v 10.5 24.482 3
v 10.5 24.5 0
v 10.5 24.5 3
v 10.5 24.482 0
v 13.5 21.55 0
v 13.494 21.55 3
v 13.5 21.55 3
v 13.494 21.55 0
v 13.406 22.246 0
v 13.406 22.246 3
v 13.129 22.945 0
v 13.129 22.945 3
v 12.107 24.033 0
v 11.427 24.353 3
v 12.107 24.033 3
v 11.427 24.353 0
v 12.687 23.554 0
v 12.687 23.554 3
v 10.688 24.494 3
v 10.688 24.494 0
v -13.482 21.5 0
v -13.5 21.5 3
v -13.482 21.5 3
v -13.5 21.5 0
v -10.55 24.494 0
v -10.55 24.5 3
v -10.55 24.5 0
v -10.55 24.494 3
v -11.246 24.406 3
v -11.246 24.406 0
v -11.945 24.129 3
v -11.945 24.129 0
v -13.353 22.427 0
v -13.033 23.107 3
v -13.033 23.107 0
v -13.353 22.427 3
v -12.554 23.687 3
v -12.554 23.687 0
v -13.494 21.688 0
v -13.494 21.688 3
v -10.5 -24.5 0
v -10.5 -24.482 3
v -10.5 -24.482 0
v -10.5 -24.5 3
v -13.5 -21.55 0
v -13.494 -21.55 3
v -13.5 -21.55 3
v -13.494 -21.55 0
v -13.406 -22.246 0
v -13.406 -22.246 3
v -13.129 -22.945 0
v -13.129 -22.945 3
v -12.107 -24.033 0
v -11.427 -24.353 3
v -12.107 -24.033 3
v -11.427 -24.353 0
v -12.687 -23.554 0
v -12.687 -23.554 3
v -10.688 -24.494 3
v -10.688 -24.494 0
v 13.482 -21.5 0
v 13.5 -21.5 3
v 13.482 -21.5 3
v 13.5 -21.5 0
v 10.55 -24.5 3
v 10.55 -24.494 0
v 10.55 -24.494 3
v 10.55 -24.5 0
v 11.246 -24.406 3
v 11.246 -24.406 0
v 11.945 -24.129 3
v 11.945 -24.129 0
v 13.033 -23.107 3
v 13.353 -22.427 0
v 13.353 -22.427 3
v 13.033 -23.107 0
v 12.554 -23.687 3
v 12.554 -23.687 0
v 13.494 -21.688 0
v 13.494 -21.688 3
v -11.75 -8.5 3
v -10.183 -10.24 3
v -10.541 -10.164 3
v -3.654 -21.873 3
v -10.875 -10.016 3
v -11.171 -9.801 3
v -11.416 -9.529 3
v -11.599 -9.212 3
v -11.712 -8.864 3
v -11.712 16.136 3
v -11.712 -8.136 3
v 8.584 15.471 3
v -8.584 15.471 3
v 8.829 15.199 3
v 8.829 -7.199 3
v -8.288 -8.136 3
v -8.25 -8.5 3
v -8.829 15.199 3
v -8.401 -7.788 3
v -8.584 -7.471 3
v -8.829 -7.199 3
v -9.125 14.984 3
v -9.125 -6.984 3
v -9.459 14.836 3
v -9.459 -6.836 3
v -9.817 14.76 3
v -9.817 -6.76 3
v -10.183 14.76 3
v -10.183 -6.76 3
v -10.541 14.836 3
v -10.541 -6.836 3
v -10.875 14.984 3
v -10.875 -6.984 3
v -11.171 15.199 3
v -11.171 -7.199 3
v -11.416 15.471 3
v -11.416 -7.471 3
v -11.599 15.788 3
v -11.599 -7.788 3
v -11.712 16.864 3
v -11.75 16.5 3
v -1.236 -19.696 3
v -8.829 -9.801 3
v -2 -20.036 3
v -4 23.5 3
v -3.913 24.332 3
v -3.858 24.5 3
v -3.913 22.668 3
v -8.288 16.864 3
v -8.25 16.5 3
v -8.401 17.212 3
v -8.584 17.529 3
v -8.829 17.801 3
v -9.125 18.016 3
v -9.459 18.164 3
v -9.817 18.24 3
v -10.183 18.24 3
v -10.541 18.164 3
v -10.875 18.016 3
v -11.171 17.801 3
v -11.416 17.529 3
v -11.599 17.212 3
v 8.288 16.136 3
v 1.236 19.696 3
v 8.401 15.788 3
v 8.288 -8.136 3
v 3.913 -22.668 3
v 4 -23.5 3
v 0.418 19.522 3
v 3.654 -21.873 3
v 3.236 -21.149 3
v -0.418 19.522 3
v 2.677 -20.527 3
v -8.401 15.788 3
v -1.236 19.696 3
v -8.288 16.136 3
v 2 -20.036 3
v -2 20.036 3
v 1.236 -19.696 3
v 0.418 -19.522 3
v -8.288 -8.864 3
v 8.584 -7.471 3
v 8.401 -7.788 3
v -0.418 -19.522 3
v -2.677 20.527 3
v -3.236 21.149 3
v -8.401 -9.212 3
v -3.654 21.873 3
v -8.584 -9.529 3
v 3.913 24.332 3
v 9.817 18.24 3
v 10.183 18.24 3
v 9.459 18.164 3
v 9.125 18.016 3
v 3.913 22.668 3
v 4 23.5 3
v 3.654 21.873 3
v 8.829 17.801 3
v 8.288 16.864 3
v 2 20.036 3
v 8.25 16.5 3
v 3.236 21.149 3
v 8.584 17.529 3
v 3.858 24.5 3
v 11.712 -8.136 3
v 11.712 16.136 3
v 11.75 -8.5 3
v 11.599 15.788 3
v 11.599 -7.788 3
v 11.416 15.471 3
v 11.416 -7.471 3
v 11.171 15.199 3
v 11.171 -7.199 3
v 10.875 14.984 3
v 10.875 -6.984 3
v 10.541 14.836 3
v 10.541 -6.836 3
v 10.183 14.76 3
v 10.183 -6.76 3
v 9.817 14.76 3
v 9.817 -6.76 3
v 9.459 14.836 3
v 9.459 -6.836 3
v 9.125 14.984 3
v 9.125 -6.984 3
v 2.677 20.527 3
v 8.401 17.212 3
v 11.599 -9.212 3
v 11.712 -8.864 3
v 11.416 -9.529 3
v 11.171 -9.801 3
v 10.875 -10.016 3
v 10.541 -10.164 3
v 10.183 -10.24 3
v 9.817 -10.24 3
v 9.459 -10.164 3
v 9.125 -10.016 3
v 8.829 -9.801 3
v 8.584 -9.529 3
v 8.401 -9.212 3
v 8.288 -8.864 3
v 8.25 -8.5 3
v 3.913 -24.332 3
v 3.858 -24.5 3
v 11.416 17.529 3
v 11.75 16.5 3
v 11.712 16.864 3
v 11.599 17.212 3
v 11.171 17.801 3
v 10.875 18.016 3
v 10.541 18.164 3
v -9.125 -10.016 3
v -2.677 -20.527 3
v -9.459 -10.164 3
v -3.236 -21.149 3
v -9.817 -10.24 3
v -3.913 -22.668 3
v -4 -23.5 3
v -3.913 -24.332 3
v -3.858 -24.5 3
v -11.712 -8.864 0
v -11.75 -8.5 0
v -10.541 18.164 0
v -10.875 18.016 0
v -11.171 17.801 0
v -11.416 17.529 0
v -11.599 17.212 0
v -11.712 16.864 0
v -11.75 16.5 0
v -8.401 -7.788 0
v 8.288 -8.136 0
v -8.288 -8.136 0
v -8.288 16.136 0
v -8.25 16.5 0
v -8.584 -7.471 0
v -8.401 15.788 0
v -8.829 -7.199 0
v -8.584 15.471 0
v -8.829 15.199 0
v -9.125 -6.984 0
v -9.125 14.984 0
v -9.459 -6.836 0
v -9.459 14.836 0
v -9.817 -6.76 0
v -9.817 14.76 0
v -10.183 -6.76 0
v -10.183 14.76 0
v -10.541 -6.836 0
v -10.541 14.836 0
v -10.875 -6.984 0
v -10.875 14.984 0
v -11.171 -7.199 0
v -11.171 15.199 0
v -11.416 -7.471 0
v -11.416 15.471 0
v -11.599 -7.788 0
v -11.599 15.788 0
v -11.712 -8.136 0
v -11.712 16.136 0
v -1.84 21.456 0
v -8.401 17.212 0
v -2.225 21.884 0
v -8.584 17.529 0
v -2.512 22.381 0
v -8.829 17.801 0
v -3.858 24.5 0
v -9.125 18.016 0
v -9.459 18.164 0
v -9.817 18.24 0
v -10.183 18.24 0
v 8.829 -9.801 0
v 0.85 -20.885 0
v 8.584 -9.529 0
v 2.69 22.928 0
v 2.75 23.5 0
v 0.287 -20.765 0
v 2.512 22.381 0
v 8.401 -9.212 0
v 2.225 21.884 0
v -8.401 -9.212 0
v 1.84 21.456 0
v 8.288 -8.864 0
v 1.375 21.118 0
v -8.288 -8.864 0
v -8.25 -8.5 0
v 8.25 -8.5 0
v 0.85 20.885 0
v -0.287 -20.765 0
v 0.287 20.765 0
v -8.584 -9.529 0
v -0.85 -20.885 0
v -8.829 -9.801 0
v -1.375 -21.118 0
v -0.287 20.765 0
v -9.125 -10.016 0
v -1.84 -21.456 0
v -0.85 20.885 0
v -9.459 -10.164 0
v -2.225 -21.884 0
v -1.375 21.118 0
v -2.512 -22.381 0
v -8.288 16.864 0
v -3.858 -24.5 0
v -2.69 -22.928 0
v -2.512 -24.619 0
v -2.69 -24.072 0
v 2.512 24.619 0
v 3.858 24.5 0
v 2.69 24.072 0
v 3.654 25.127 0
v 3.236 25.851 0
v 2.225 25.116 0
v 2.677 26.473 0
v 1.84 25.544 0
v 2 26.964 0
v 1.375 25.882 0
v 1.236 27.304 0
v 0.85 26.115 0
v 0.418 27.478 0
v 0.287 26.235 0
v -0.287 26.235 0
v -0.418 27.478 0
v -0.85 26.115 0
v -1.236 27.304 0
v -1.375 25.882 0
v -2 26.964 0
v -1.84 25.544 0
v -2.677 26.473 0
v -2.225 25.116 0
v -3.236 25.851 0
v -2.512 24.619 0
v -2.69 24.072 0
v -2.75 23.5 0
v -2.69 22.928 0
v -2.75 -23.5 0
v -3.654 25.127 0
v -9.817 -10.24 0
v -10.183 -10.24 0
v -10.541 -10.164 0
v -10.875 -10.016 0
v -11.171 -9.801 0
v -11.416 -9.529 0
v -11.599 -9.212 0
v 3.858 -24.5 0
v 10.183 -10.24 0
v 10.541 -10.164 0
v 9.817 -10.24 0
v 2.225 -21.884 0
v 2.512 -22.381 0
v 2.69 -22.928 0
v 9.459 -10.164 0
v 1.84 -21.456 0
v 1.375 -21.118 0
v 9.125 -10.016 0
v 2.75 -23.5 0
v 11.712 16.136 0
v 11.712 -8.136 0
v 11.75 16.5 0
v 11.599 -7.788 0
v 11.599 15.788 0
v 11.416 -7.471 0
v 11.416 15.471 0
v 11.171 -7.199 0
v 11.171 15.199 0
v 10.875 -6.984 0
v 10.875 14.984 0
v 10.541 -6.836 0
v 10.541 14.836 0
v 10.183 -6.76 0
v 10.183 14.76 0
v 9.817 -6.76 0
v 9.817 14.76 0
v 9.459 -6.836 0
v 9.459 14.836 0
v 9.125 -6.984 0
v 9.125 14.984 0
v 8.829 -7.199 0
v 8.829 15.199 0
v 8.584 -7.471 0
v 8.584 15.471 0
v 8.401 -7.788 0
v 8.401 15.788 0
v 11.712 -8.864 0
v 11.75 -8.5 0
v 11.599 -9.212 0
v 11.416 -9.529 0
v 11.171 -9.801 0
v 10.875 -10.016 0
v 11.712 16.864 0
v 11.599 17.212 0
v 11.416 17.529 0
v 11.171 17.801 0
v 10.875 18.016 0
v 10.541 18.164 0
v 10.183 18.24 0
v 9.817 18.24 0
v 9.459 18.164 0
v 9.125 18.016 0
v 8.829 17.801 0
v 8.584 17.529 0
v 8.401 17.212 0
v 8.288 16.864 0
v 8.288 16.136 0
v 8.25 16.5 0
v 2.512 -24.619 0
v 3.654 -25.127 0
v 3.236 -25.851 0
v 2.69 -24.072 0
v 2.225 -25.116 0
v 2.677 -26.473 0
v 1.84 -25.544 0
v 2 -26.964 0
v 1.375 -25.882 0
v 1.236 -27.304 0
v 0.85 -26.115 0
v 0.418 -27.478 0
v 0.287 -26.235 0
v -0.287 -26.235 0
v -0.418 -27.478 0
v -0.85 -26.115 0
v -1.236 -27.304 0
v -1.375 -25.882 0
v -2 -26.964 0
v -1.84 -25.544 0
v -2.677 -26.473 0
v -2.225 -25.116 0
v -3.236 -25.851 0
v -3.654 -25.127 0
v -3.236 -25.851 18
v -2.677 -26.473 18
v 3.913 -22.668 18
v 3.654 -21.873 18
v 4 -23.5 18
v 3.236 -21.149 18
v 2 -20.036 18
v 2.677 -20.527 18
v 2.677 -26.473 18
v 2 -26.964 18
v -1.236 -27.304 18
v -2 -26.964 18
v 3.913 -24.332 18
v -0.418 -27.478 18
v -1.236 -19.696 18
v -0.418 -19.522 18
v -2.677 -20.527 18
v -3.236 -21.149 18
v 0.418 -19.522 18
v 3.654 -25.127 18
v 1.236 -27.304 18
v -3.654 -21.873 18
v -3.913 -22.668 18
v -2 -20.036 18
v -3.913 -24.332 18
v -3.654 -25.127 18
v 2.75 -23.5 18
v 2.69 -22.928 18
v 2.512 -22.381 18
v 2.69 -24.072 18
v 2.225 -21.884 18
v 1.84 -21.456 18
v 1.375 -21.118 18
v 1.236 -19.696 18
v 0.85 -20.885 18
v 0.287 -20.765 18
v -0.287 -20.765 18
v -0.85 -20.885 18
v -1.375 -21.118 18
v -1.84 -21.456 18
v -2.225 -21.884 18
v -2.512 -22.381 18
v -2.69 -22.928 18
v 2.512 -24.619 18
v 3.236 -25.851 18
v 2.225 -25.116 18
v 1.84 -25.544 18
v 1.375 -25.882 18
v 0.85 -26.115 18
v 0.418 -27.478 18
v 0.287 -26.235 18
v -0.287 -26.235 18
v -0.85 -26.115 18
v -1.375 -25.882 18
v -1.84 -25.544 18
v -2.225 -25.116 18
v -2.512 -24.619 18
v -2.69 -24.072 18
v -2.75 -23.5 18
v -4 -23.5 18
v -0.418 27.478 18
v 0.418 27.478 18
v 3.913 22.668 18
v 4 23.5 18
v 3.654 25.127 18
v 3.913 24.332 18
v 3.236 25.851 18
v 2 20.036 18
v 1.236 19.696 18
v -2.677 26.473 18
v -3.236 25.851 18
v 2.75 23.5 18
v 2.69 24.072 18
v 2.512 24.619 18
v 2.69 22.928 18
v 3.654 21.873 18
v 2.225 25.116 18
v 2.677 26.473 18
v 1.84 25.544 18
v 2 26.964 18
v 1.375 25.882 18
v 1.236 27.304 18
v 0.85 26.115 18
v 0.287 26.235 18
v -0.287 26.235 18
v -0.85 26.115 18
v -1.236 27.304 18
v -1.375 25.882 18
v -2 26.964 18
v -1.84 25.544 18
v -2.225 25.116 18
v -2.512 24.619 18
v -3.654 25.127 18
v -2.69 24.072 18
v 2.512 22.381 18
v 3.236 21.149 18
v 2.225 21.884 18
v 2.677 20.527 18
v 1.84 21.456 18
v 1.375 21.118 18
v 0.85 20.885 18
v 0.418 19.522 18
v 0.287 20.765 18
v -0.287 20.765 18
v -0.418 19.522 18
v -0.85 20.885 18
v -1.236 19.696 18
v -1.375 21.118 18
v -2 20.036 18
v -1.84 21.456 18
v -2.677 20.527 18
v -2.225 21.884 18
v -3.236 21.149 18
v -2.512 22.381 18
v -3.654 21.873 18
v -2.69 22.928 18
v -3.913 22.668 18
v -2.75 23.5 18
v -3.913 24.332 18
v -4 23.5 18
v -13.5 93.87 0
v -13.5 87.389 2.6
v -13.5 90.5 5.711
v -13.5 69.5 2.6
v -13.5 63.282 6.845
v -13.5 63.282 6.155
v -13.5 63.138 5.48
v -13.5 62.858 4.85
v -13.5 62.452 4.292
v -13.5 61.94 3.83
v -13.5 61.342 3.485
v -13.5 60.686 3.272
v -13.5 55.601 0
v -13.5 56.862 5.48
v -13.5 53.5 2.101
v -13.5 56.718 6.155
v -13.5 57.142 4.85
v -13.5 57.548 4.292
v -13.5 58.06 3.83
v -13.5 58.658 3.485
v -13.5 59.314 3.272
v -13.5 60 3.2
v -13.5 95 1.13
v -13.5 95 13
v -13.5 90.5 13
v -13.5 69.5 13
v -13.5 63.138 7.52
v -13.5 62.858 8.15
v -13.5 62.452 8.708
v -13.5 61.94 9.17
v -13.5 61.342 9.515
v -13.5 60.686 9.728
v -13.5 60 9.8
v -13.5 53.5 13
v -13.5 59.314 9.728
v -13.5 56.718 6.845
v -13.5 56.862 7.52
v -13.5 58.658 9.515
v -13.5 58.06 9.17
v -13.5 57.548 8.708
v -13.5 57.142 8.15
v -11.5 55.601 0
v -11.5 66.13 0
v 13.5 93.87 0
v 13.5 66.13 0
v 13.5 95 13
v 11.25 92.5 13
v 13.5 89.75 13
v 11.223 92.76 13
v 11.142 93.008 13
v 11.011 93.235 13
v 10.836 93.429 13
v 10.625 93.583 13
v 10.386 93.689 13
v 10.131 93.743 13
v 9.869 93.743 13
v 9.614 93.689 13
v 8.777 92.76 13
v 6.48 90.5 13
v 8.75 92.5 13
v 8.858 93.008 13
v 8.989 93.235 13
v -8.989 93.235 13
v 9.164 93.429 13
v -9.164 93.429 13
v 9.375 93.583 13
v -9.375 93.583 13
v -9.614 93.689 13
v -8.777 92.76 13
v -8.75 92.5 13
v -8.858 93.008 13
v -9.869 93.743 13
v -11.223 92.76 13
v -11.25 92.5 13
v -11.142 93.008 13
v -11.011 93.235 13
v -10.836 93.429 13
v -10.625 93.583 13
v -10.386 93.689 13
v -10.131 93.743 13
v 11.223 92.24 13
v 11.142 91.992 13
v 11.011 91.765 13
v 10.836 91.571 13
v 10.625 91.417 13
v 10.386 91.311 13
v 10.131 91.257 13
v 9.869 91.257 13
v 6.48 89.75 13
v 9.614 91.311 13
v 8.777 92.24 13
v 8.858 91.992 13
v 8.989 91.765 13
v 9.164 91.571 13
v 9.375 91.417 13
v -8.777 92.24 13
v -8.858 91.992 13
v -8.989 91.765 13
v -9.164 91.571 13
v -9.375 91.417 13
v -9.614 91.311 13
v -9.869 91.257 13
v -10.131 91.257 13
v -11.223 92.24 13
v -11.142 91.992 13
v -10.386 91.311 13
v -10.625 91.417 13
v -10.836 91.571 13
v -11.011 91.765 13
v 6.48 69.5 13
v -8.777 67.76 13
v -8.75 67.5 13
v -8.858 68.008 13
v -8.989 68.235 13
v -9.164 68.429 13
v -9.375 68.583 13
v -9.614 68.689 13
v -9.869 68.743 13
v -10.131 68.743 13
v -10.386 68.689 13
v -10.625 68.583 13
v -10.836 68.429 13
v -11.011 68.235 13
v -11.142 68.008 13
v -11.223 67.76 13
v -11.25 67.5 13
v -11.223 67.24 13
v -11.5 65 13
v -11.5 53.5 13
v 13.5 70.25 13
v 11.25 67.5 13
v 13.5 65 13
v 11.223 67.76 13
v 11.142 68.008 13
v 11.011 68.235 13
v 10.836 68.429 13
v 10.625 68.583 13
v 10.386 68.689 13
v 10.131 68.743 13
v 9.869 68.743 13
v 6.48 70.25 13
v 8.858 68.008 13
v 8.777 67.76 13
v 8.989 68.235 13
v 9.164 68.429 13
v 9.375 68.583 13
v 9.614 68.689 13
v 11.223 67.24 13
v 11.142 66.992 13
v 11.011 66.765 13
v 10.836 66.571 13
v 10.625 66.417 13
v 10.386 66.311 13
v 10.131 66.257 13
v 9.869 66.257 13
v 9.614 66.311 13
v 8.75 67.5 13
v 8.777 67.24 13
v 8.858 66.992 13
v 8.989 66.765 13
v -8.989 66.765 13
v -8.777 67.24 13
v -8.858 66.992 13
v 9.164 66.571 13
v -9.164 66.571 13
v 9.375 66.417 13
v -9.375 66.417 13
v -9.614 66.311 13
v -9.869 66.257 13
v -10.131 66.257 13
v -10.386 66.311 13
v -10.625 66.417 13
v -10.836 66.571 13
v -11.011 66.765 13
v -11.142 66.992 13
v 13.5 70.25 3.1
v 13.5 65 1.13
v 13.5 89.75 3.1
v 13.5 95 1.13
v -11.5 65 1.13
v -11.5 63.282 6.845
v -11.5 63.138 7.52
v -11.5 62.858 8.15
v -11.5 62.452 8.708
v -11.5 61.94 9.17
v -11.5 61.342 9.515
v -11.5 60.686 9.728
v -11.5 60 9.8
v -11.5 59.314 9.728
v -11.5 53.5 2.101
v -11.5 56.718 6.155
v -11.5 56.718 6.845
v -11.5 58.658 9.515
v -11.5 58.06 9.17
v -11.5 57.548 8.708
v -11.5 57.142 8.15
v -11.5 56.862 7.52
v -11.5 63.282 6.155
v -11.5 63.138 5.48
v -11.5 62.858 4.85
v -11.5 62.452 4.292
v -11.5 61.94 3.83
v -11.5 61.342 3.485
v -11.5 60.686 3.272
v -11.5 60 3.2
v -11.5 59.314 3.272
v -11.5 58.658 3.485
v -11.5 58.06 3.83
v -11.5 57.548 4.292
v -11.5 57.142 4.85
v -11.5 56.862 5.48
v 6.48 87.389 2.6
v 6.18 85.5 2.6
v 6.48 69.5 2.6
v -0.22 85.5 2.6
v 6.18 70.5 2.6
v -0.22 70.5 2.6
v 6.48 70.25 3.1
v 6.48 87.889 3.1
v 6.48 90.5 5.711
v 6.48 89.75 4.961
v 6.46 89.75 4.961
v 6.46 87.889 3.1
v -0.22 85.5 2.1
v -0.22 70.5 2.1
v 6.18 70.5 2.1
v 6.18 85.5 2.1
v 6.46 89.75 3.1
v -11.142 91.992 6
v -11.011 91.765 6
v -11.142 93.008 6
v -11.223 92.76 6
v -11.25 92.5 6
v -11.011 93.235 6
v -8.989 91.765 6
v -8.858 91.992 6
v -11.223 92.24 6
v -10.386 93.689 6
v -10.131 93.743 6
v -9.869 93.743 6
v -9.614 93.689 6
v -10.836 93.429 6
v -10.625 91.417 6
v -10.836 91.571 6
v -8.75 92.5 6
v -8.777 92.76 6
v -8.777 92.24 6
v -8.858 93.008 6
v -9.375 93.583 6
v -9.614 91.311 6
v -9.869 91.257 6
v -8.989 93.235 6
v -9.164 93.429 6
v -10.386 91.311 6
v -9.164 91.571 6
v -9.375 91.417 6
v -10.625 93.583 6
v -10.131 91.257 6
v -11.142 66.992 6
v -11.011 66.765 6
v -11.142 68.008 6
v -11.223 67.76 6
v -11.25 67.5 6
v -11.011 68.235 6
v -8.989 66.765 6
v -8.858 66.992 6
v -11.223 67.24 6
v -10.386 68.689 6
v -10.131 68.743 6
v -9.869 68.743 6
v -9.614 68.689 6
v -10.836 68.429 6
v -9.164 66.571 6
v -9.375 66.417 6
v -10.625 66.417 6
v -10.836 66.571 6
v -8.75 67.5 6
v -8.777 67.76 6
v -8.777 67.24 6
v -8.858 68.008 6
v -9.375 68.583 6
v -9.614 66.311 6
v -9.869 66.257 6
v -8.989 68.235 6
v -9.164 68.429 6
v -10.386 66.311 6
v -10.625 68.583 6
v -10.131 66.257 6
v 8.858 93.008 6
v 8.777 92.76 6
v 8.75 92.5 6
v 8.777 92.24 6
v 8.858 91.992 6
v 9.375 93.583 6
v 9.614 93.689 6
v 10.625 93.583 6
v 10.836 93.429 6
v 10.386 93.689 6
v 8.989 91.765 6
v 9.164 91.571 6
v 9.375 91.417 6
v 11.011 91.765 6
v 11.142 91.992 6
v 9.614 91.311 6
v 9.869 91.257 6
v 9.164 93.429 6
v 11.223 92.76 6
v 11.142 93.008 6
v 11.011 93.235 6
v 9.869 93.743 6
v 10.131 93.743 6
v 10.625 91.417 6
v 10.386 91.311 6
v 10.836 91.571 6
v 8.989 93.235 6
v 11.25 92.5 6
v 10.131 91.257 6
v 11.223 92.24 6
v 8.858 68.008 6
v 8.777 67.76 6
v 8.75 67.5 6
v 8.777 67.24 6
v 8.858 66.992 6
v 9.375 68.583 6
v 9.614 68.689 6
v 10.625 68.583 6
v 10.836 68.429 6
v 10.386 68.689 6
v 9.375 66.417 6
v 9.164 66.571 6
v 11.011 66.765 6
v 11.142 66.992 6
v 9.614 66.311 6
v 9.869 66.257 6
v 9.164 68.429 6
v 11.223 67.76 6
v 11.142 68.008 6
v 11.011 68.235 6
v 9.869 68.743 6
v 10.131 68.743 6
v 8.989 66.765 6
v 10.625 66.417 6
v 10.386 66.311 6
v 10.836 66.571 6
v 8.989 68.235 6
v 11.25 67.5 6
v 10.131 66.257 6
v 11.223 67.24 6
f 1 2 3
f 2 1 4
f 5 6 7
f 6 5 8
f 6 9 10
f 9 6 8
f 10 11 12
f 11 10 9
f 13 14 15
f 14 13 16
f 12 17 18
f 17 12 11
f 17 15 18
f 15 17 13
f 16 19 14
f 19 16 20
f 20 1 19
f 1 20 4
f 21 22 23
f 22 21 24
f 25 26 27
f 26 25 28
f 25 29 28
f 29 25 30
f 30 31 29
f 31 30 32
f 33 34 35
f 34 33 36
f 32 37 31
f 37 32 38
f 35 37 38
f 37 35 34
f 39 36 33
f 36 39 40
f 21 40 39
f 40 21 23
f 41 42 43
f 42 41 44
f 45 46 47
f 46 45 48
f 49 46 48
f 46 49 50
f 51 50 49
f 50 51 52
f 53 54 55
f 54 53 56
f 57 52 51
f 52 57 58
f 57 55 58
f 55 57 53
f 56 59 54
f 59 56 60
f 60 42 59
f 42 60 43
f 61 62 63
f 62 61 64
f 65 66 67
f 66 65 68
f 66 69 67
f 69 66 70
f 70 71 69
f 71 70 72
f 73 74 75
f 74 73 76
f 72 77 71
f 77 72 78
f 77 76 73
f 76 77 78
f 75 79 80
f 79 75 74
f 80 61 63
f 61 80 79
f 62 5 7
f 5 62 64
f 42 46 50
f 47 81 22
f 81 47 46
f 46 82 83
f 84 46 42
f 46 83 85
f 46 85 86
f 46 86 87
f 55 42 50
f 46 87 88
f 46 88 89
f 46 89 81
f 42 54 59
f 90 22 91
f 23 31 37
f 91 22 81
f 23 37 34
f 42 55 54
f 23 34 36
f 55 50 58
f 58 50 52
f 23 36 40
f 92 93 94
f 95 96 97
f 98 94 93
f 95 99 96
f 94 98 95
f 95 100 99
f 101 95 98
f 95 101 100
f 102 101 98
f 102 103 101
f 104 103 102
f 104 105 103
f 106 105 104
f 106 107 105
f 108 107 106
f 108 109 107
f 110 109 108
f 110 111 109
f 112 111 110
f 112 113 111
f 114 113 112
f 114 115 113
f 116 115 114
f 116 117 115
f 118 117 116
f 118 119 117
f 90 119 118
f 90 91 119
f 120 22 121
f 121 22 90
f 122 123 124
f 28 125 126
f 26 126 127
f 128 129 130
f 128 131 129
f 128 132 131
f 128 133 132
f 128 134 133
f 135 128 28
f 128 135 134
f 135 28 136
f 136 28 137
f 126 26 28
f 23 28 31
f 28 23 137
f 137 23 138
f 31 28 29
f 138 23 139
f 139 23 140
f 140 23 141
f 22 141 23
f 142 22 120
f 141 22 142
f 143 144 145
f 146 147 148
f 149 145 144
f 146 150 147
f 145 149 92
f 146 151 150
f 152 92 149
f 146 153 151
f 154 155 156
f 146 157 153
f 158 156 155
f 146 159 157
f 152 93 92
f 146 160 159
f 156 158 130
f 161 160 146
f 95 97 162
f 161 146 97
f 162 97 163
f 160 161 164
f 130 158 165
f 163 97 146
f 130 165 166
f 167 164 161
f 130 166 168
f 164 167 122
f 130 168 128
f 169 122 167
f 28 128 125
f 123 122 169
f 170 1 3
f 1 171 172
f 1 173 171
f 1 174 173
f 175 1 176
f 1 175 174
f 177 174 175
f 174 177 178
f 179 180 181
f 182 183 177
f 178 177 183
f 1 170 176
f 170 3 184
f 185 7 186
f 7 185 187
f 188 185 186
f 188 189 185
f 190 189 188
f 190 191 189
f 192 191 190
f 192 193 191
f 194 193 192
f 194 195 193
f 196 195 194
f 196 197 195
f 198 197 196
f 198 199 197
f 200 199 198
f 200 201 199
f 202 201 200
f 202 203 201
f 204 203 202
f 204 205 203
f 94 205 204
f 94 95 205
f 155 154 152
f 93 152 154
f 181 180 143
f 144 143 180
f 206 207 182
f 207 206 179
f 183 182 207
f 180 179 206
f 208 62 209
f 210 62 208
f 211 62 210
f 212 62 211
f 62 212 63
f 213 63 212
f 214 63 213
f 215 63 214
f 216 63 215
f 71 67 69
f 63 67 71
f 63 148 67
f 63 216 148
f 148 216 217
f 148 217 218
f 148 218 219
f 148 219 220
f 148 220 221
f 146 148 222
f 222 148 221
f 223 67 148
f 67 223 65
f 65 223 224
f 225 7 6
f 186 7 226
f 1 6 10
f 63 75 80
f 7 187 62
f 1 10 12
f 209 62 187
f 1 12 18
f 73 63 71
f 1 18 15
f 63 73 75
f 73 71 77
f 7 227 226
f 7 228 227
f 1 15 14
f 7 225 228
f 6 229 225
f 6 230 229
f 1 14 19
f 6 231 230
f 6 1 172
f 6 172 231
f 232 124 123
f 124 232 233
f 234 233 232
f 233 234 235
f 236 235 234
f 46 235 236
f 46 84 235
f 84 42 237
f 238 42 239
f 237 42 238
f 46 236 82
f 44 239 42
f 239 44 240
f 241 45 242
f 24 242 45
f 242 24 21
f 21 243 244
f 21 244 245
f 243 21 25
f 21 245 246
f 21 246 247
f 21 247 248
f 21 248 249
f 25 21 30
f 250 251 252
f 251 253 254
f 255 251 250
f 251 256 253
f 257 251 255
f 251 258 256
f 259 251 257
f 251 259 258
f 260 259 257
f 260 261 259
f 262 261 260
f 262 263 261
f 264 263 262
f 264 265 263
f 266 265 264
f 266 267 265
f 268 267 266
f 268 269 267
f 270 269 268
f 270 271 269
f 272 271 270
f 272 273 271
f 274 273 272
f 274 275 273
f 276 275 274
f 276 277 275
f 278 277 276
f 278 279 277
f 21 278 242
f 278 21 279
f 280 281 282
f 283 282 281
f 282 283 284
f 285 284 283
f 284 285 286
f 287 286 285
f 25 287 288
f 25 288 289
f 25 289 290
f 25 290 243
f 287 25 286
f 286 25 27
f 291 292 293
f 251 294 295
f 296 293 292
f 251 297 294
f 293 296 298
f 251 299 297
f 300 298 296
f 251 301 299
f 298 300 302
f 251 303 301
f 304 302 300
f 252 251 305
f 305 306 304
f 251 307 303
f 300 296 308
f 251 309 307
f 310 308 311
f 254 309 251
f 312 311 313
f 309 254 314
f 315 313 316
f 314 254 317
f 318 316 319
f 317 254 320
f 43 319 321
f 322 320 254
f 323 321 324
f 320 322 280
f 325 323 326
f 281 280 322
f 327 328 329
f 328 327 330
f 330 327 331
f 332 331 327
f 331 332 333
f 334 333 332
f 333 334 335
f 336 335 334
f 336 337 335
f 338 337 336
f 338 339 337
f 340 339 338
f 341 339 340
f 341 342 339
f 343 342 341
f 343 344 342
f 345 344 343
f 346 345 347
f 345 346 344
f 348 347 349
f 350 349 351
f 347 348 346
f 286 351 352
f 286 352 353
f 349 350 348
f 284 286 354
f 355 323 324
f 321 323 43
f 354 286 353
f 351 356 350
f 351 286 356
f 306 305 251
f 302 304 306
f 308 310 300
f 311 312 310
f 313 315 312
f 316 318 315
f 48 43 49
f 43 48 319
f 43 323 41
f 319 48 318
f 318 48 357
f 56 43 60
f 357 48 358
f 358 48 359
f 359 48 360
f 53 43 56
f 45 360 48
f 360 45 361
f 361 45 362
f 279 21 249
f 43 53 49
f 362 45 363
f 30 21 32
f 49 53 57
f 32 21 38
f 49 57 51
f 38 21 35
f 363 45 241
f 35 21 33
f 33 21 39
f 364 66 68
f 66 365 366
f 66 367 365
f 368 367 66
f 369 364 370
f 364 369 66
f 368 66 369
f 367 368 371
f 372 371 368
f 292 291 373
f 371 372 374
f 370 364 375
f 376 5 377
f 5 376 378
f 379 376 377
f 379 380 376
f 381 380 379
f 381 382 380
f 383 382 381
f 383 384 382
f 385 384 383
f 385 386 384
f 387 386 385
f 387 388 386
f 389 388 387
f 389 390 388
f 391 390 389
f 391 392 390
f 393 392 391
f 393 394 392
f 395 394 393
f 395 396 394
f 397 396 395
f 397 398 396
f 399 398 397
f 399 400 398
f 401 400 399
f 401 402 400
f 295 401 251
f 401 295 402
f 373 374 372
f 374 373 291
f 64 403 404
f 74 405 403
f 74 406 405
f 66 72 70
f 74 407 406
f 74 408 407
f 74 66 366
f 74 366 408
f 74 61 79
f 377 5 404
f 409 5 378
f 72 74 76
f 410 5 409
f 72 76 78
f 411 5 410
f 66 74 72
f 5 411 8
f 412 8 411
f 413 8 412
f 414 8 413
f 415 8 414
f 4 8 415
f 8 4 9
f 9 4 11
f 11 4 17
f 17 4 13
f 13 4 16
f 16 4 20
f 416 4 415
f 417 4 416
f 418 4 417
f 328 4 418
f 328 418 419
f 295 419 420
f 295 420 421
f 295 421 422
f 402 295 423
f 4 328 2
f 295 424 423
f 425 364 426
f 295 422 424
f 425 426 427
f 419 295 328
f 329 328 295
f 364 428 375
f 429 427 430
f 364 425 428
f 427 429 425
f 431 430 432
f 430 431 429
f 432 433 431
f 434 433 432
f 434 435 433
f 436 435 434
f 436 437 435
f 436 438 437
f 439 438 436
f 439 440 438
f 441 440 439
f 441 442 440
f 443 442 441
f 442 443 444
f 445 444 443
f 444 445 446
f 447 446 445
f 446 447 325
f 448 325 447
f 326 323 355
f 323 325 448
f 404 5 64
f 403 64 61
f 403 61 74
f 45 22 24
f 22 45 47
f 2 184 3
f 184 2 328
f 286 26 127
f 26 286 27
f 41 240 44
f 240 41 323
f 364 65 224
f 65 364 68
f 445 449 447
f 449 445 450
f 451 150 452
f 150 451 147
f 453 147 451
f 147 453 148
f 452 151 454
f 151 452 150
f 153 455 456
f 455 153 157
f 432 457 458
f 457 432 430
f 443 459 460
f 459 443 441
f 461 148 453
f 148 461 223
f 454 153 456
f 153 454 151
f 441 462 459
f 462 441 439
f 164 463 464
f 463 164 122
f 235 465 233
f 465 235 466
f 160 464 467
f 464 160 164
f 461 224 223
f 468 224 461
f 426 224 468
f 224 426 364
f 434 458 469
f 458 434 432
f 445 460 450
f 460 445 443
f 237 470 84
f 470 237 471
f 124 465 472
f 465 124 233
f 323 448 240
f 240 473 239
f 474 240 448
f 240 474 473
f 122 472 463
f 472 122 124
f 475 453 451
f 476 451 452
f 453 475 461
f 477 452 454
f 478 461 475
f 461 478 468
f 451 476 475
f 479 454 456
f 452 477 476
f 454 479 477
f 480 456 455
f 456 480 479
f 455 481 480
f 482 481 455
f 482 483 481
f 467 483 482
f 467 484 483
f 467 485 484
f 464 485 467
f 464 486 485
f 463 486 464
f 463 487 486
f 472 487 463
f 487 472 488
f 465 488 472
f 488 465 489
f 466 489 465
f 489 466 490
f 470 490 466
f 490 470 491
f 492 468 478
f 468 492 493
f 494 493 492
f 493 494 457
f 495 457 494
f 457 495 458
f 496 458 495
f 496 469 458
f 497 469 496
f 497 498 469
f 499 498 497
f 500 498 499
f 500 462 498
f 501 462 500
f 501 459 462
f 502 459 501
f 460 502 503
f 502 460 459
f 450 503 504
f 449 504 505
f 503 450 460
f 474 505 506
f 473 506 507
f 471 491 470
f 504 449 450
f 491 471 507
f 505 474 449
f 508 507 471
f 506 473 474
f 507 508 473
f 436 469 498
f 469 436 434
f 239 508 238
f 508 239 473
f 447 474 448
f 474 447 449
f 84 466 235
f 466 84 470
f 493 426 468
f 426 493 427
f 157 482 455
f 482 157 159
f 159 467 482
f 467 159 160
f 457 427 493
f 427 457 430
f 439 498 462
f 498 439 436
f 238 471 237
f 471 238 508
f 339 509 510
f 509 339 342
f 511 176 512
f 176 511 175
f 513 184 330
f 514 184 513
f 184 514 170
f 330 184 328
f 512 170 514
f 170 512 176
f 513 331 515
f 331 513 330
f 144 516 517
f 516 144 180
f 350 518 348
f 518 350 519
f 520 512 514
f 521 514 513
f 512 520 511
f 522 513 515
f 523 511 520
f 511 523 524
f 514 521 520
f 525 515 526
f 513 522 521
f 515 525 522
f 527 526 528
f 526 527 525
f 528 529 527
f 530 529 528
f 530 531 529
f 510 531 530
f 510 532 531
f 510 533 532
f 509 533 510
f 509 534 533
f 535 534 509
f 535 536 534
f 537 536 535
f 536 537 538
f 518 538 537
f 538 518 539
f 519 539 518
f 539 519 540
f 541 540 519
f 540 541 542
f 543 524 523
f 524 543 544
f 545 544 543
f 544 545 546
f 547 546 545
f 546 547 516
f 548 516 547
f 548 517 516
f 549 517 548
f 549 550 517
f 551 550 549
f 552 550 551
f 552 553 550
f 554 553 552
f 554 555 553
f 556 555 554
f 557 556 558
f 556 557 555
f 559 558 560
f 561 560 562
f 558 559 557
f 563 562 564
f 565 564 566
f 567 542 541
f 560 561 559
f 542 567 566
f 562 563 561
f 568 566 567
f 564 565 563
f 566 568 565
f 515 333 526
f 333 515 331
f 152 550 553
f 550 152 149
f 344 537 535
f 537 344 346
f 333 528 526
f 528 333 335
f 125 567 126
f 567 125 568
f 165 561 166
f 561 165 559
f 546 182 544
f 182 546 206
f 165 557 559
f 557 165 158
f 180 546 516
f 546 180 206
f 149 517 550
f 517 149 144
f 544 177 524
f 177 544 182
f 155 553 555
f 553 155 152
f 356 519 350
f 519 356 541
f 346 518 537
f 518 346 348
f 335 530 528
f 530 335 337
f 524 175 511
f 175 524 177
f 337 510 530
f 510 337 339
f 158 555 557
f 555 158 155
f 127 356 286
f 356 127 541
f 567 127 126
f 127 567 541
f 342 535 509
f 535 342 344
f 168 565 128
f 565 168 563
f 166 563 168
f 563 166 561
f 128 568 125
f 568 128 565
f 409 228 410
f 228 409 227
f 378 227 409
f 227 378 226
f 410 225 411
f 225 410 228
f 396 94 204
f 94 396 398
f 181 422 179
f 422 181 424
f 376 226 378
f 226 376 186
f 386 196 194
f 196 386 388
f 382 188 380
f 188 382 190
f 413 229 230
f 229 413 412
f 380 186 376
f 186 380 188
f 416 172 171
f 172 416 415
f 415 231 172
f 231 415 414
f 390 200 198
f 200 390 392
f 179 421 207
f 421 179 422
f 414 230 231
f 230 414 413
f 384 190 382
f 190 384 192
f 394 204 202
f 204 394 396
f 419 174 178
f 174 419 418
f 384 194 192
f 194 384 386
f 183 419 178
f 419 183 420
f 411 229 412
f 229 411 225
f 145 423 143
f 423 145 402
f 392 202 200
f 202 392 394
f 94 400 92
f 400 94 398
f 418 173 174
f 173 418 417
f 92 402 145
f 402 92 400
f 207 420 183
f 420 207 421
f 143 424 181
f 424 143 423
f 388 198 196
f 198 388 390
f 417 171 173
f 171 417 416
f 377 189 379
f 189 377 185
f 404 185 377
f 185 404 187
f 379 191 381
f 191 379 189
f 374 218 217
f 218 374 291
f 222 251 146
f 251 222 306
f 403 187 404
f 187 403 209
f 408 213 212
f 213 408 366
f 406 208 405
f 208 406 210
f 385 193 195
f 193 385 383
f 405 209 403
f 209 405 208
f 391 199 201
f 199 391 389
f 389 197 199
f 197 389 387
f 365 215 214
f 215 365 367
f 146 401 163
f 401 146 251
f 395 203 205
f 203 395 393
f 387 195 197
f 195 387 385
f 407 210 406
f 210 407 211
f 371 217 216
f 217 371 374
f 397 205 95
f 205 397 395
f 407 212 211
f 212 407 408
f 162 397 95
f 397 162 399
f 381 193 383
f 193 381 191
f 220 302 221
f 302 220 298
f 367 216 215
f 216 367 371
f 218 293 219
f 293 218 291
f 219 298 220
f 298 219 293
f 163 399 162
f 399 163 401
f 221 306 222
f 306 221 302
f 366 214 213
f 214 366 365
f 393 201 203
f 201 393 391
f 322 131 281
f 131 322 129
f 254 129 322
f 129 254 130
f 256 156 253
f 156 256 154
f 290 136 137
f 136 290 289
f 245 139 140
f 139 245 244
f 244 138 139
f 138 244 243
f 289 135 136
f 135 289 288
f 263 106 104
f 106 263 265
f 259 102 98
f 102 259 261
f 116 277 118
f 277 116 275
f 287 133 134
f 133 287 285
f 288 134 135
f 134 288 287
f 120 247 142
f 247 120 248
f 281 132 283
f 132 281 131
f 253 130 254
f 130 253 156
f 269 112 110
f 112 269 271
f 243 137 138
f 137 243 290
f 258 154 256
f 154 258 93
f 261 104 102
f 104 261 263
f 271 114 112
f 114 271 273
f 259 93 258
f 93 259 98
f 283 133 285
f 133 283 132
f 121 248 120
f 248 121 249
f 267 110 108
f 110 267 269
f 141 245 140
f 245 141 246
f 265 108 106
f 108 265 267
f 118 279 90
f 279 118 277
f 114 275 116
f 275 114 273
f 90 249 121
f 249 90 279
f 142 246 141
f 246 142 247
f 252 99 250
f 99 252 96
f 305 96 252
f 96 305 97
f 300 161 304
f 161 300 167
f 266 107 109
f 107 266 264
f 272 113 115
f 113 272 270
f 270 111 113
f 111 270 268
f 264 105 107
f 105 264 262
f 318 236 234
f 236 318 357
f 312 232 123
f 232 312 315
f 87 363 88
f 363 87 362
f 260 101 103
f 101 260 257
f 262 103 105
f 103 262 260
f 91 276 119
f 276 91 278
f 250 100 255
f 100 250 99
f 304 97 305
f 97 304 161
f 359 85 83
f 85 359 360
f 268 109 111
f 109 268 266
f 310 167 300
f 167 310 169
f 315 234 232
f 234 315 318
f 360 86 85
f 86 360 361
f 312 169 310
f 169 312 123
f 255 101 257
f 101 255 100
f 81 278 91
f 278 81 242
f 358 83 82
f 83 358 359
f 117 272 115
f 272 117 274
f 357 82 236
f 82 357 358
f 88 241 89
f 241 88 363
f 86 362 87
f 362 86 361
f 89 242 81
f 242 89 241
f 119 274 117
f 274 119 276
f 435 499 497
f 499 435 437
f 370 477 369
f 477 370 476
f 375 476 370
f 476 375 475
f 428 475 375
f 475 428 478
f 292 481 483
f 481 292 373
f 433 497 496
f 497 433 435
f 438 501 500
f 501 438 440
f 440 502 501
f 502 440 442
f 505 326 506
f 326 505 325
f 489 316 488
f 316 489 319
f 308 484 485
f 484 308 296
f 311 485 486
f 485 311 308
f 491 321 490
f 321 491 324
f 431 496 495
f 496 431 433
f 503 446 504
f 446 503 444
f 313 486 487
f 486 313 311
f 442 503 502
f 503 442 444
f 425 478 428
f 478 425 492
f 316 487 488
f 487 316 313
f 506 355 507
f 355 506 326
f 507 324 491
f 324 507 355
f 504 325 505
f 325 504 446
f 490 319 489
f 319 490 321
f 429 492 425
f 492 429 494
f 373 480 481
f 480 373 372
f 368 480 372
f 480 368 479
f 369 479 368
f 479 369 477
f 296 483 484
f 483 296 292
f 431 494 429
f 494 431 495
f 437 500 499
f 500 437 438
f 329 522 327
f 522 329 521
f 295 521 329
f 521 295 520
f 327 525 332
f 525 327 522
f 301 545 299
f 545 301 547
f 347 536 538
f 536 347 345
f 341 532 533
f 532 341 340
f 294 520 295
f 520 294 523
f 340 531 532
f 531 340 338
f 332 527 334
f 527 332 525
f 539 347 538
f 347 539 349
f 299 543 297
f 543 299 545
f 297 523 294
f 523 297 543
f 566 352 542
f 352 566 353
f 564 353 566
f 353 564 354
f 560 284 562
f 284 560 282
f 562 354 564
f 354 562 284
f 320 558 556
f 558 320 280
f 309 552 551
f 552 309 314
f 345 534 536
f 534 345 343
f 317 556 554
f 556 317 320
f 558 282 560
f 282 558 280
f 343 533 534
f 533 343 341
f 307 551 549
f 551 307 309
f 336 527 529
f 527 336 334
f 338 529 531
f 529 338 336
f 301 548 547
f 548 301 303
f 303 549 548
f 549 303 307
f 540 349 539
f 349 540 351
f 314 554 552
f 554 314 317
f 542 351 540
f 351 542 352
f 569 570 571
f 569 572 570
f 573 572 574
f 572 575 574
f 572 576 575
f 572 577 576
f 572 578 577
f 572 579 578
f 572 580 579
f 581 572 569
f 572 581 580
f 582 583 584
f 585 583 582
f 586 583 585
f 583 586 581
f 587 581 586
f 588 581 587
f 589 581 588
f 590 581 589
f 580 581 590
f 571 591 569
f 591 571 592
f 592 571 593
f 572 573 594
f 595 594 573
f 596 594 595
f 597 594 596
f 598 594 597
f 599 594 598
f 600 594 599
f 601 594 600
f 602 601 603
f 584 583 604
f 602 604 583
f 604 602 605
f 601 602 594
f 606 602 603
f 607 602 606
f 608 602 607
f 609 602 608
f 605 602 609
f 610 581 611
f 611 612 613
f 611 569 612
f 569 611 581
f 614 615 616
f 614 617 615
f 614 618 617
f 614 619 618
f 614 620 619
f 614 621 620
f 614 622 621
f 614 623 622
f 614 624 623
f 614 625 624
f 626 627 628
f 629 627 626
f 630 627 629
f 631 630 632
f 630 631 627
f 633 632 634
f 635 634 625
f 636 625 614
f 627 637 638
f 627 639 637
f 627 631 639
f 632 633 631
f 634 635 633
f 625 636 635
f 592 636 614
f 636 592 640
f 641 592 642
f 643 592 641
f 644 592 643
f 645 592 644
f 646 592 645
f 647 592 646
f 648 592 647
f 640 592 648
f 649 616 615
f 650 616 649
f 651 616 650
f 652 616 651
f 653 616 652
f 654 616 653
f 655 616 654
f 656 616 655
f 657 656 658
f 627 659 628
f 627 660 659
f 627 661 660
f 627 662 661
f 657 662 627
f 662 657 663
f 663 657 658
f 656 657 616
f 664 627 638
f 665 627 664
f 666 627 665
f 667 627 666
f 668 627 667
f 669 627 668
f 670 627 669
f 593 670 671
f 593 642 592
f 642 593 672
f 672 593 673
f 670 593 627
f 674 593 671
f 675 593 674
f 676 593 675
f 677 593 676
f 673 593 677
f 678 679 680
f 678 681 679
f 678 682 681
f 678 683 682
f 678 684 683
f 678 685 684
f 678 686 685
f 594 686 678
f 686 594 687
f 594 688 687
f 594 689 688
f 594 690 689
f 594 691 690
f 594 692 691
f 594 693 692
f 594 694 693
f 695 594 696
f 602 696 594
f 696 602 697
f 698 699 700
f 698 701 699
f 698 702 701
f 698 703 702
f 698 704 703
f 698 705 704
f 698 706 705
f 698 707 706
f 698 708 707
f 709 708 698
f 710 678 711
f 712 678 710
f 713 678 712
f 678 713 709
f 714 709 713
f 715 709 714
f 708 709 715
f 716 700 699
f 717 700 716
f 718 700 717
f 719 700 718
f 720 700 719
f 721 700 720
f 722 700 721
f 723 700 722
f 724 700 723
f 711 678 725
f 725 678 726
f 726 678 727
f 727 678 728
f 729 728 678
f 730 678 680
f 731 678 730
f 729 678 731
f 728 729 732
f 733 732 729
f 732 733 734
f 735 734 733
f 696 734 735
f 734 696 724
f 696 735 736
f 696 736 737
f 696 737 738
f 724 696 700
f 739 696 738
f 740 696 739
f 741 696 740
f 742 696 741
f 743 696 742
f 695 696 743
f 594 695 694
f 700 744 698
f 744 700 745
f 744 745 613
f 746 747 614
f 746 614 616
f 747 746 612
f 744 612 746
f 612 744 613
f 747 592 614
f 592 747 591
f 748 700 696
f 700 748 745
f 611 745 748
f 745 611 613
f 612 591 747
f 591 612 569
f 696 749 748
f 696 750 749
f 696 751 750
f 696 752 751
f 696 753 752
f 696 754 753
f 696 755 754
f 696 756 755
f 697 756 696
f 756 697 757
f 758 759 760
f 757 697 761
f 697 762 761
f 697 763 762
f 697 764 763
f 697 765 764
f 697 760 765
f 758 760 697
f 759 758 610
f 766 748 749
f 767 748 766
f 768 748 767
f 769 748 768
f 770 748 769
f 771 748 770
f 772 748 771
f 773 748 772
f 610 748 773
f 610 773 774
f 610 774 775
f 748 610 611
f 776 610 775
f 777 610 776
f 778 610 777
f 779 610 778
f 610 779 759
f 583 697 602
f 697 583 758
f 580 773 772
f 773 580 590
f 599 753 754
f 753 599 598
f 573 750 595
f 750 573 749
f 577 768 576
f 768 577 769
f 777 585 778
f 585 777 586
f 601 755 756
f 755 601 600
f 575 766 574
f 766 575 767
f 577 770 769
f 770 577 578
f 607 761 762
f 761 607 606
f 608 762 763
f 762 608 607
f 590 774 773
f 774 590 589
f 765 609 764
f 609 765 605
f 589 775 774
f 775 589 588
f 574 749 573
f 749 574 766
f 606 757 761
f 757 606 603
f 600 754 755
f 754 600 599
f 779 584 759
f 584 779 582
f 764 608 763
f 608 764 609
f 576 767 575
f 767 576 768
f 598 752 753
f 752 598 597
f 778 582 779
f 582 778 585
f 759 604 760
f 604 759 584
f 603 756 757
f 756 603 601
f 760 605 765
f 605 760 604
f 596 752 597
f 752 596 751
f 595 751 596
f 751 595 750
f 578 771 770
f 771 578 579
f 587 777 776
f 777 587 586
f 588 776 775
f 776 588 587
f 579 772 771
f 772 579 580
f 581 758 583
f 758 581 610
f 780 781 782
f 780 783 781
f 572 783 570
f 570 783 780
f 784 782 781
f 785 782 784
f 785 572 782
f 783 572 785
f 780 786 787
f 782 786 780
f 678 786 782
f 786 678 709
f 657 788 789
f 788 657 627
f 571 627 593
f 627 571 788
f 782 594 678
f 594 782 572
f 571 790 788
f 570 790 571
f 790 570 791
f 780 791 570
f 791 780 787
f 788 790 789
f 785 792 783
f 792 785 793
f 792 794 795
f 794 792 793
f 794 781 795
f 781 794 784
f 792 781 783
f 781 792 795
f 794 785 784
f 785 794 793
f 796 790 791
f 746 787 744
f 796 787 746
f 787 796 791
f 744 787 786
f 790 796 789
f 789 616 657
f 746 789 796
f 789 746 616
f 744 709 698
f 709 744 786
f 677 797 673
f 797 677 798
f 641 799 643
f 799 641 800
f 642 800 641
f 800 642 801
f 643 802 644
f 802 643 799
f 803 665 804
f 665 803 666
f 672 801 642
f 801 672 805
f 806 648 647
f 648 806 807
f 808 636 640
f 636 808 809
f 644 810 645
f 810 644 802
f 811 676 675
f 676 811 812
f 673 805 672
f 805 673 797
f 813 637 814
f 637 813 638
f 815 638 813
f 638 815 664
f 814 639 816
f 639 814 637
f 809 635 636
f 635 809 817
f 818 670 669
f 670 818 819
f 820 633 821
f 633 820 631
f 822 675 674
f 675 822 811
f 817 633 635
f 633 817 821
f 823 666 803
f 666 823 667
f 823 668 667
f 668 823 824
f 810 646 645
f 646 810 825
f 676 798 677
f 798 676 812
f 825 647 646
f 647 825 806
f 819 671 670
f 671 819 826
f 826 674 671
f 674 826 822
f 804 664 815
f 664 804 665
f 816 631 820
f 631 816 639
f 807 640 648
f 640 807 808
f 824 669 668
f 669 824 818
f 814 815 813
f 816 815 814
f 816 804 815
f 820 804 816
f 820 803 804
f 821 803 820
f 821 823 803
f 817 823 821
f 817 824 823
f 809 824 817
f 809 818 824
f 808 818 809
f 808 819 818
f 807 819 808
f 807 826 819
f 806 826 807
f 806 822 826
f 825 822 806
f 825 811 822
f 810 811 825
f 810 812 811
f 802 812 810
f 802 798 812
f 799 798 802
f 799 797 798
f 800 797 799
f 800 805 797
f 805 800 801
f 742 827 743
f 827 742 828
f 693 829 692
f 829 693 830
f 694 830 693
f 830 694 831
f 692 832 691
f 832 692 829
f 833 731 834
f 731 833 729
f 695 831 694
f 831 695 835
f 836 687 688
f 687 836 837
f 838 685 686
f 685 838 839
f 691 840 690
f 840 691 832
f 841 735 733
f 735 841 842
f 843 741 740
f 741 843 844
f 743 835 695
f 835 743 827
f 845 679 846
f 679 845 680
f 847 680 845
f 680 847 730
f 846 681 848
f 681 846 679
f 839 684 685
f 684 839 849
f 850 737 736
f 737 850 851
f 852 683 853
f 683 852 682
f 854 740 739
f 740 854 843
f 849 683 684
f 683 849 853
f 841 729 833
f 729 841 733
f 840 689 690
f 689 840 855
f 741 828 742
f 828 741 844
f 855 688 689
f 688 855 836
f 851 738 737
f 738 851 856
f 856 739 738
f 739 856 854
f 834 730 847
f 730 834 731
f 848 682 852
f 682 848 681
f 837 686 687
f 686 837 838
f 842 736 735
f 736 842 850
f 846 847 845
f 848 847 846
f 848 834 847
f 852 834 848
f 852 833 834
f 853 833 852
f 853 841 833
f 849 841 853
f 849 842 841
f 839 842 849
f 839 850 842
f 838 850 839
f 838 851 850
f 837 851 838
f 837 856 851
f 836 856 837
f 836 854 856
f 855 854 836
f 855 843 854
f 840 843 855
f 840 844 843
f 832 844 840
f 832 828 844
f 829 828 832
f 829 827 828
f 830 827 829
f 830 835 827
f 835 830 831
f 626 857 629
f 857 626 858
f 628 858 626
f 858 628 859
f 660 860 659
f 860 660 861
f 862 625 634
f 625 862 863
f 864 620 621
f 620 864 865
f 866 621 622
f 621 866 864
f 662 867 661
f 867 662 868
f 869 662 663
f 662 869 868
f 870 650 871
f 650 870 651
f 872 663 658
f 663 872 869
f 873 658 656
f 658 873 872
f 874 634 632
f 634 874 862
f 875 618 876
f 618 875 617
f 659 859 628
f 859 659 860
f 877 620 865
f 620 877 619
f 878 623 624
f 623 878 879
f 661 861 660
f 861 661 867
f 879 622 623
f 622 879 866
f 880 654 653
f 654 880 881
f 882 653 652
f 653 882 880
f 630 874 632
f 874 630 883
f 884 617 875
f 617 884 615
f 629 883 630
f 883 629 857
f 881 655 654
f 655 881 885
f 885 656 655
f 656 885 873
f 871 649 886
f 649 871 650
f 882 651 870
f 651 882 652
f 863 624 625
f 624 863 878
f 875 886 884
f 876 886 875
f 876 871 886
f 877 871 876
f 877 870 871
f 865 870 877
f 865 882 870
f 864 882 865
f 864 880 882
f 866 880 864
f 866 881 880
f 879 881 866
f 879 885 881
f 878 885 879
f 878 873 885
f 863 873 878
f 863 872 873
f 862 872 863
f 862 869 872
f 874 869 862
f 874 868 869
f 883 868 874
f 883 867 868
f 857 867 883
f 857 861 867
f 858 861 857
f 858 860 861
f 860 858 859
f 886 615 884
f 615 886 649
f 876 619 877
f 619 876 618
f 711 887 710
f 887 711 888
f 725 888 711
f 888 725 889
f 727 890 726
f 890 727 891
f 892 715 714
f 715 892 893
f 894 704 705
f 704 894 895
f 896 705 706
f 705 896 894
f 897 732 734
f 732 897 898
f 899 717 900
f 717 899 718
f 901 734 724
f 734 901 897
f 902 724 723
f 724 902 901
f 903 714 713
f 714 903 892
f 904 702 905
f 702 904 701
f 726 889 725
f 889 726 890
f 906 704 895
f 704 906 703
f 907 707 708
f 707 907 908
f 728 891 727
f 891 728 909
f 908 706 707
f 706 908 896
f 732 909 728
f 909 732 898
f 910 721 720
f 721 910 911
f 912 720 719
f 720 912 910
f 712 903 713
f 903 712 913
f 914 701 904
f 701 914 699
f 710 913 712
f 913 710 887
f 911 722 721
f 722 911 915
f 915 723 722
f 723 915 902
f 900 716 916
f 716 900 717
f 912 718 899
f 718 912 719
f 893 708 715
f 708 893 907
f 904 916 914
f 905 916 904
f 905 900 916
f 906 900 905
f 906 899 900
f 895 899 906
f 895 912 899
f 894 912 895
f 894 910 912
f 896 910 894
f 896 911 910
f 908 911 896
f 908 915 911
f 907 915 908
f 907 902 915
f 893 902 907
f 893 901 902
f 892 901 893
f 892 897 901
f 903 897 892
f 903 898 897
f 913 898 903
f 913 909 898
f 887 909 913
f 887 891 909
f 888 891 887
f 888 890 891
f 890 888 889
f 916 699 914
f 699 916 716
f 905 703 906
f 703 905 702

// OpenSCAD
// XT90Holder for Tarot 680 - a OpenSCAD 
// Copyright (C) 2015  Gerard Valade

// This program is free software: you can redistribute it and/or modify
// it under the terms of the GNU General Public License as published by
// the Free Software Foundation, either version 3 of the License, or
// (at your option) any later version.

// This program is distributed in the hope that it will be useful,
// but WITHOUT ANY WARRANTY; without even the implied warranty of
// MERCHANTABILITY or FITNESS FOR A PARTICULAR PURPOSE.  See the
// GNU General Public License for more details.

// You should have received a copy of the GNU General Public License
// along with this program.  If not, see <http://www.gnu.org/licenses/>.

$fn=30;
length = 27;
width = 30;
heigth = 13;
M3_dia = 3.5;
M3_hole = 2.5;

module roundCornersCube(x,y,z,r)  // Now we just substract the shape we have created in the four corners
{
	module createMeniscus(h,radius) // This module creates the shape that needs to be substracted from a cube to make its corners rounded.
	{
		difference(){        //This shape is basicly the difference between a quarter of cylinder and a cube
		   translate([radius/2+0.1,radius/2+0.1,0]){
		      cube([radius+0.2,radius+0.1,h+0.2],center=true);         // All that 0.x numbers are to avoid "ghost boundaries" when substracting
		   }
		
		   cylinder(h=h+0.2,r=radius,$fn = 25,center=true);
		}
	
	}
	difference(){
	   cube([x,y,z], center=true);
	
	translate([x/2-r,y/2-r]){  // We move to the first corner (x,y)
	      rotate(0){  
	         createMeniscus(z,r); // And substract the meniscus
	      }
	   }
	   translate([-x/2+r,y/2-r]){ // To the second corner (-x,y)
	      rotate(90){
	         createMeniscus(z,r); // But this time we have to rotate the meniscus 90 deg
	      }
	   }
	      translate([-x/2+r,-y/2+r]){ // ... 
	      rotate(180){
	         createMeniscus(z,r);
	      }
	   }
	      translate([x/2-r,-y/2+r]){
	      rotate(270){
	         createMeniscus(z,r);
	      }
	   }
	}
}


module XT90Base()
{
	translate([0,0,(heigth)/2]) {
		cube([length,width,heigth], center=true);
		translate([(length-5)/2,0,0]) cube([5,30,heigth], center=true);
		//#translate([0, -17,6]) cube([31, 12, 24], center=true);
	}
}
module XT90BasePlate()
{
	translate([0,0,1.8/2]) {
		difference() {
			cube([length+0.5,width+0.5,1.8], center=true);
			hull() {
				translate([0, -4, 0]) cylinder(d=12, h=10, center=true);
				translate([0, 4, 0]) cylinder(d=12, h=10, center=true);
			}
		}
	}
}

module XT90positf(cut=4.9)
{
	difference() {
		cube([20,21,10], center=true);
		translate([0, 10.5, 5]) rotate([45, 0, 0]) cube([21,cut,cut], center=true);
		translate([0, 10.5, -5]) rotate([45, 0, 0]) cube([21,cut,cut], center=true);
	}
	
}
	

module XT90HoleScrew(dia=2.2)
{
	for(x=[1,-1]) for(y=[1, -1]) translate([x*10, y*12.5, 2]) cylinder(d=dia, h=10, center=true);	
	//#for(x=[1,-1]) for(y=[1, -1]) translate([x*10, y*43/2, 2]) cylinder(d=dia, h=10, center=true);	
}

module XT90Hole()
{
	translate([(length-20)/2+0.02, 0, 10/2+0.4]) {
		XT90positf(cut=4.4);
		translate([0, 0, -5]) cube([20,21,10], center=true);
		translate([-6.5, -2, 3.5+1]) cube([6.4,15,2], center=true);
		translate([-(20+10)/2 + 0.02, 0, -1.5])cube([10, 19.5, 12], center=true);
	}
}

module XT90()
{
	translate([0, 0, heigth]) rotate([0, 180, 0]) {
		difference()
		{
			union() {
				difference() {
				XT90Base();
				translate([0,0,0]) rotate([45, 0, 0]) translate([0,0,24])  cube([50, 10, 10], center=true);
				translate([0,0,0]) rotate([45, 0, 0]) translate([0,24,0])  cube([50, 10, 10], center=true);
				
				}
				translate([12.5, -21, 6.5])  difference()
				{
					translate([0,1,0]) cube([2, 13, 13], center=true);
					translate([-10, 1, 0]) rotate([0, 90, 0]) cylinder(d=6.6, h=20);
					translate([0,0,0]) rotate([45, 0, 0]) translate([0,0,12])  cube([10, 10, 10], center=true);
					translate([0,0,0]) rotate([45, 0, 0]) translate([0,0,12])  cube([10, 10, 10], center=true);
				}
				
			}
			XT90Hole();
			XT90HoleScrew(M3_hole);
		}
	}
}
module XT90Plate()
{
	difference() {
		XT90BasePlate();
		XT90HoleScrew(dia=2.7);
	}
}


module XT90_holder()
{
	module plain()
	{
		translate([0, 0, 1.5])  roundCornersCube(16+10, 56-0.8, 2, 3);
		roundCornersCube(16, 30, 2, 3);
		
	}
	module hole()
	{
		for(y=[1, -1]) translate([0, y*43/2, 2]) cylinder(d=M3_dia, h=10, center=true);	
	}
	difference() {
		plain();
		XT90HoleScrew(dia=2.7);
		hole();
		
	}
	
}

module XT90_plate()
{
	pillar_width = 47;
	module plain()
	{
		//translate([0, 0, 1.5])  roundCornersCube(16+11, 56-0.8, 3, 3);
		translate([0, 0, 1.5])  roundCornersCube(16+11, 49, 3, 3);
		for(y=[-1,1])
			translate([0, y*pillar_width/2, 0])  cylinder(d=8, h=18);
		//roundCornersCube(16, 30, 2, 3);
		
	}
	module hole()
	{
		//for(y=[1, -1]) translate([0, y*43/2, 2]) cylinder(d=M3_dia, h=10, center=true);	
		for(y=[-1,1])
			translate([0, y*pillar_width/2, -1])  cylinder(d=5.5, h=25);
	}
	difference() {
		plain();
		translate([0, 4, 0]) XT90HoleScrew(M3_dia);
		hole();
	}
	
}

module view()
{
	translate([0, 0, 0])  
	{
		translate([0, -4, 0])  rotate([0, 0, 0])  XT90_plate();
		translate([0, 0, 13+3])  rotate([0, 180, 0]) XT90();
		
	}
}

//view();
translate([0, 0, 0])  XT90_plate();
translate([0, 80, 0])  rotate([0, 0, 0]) XT90();

//translate([0, 0, 0])  rotate([0, 0, 0]) XT90_holder();
//translate([0, 80, 0]) XT90Plate();
